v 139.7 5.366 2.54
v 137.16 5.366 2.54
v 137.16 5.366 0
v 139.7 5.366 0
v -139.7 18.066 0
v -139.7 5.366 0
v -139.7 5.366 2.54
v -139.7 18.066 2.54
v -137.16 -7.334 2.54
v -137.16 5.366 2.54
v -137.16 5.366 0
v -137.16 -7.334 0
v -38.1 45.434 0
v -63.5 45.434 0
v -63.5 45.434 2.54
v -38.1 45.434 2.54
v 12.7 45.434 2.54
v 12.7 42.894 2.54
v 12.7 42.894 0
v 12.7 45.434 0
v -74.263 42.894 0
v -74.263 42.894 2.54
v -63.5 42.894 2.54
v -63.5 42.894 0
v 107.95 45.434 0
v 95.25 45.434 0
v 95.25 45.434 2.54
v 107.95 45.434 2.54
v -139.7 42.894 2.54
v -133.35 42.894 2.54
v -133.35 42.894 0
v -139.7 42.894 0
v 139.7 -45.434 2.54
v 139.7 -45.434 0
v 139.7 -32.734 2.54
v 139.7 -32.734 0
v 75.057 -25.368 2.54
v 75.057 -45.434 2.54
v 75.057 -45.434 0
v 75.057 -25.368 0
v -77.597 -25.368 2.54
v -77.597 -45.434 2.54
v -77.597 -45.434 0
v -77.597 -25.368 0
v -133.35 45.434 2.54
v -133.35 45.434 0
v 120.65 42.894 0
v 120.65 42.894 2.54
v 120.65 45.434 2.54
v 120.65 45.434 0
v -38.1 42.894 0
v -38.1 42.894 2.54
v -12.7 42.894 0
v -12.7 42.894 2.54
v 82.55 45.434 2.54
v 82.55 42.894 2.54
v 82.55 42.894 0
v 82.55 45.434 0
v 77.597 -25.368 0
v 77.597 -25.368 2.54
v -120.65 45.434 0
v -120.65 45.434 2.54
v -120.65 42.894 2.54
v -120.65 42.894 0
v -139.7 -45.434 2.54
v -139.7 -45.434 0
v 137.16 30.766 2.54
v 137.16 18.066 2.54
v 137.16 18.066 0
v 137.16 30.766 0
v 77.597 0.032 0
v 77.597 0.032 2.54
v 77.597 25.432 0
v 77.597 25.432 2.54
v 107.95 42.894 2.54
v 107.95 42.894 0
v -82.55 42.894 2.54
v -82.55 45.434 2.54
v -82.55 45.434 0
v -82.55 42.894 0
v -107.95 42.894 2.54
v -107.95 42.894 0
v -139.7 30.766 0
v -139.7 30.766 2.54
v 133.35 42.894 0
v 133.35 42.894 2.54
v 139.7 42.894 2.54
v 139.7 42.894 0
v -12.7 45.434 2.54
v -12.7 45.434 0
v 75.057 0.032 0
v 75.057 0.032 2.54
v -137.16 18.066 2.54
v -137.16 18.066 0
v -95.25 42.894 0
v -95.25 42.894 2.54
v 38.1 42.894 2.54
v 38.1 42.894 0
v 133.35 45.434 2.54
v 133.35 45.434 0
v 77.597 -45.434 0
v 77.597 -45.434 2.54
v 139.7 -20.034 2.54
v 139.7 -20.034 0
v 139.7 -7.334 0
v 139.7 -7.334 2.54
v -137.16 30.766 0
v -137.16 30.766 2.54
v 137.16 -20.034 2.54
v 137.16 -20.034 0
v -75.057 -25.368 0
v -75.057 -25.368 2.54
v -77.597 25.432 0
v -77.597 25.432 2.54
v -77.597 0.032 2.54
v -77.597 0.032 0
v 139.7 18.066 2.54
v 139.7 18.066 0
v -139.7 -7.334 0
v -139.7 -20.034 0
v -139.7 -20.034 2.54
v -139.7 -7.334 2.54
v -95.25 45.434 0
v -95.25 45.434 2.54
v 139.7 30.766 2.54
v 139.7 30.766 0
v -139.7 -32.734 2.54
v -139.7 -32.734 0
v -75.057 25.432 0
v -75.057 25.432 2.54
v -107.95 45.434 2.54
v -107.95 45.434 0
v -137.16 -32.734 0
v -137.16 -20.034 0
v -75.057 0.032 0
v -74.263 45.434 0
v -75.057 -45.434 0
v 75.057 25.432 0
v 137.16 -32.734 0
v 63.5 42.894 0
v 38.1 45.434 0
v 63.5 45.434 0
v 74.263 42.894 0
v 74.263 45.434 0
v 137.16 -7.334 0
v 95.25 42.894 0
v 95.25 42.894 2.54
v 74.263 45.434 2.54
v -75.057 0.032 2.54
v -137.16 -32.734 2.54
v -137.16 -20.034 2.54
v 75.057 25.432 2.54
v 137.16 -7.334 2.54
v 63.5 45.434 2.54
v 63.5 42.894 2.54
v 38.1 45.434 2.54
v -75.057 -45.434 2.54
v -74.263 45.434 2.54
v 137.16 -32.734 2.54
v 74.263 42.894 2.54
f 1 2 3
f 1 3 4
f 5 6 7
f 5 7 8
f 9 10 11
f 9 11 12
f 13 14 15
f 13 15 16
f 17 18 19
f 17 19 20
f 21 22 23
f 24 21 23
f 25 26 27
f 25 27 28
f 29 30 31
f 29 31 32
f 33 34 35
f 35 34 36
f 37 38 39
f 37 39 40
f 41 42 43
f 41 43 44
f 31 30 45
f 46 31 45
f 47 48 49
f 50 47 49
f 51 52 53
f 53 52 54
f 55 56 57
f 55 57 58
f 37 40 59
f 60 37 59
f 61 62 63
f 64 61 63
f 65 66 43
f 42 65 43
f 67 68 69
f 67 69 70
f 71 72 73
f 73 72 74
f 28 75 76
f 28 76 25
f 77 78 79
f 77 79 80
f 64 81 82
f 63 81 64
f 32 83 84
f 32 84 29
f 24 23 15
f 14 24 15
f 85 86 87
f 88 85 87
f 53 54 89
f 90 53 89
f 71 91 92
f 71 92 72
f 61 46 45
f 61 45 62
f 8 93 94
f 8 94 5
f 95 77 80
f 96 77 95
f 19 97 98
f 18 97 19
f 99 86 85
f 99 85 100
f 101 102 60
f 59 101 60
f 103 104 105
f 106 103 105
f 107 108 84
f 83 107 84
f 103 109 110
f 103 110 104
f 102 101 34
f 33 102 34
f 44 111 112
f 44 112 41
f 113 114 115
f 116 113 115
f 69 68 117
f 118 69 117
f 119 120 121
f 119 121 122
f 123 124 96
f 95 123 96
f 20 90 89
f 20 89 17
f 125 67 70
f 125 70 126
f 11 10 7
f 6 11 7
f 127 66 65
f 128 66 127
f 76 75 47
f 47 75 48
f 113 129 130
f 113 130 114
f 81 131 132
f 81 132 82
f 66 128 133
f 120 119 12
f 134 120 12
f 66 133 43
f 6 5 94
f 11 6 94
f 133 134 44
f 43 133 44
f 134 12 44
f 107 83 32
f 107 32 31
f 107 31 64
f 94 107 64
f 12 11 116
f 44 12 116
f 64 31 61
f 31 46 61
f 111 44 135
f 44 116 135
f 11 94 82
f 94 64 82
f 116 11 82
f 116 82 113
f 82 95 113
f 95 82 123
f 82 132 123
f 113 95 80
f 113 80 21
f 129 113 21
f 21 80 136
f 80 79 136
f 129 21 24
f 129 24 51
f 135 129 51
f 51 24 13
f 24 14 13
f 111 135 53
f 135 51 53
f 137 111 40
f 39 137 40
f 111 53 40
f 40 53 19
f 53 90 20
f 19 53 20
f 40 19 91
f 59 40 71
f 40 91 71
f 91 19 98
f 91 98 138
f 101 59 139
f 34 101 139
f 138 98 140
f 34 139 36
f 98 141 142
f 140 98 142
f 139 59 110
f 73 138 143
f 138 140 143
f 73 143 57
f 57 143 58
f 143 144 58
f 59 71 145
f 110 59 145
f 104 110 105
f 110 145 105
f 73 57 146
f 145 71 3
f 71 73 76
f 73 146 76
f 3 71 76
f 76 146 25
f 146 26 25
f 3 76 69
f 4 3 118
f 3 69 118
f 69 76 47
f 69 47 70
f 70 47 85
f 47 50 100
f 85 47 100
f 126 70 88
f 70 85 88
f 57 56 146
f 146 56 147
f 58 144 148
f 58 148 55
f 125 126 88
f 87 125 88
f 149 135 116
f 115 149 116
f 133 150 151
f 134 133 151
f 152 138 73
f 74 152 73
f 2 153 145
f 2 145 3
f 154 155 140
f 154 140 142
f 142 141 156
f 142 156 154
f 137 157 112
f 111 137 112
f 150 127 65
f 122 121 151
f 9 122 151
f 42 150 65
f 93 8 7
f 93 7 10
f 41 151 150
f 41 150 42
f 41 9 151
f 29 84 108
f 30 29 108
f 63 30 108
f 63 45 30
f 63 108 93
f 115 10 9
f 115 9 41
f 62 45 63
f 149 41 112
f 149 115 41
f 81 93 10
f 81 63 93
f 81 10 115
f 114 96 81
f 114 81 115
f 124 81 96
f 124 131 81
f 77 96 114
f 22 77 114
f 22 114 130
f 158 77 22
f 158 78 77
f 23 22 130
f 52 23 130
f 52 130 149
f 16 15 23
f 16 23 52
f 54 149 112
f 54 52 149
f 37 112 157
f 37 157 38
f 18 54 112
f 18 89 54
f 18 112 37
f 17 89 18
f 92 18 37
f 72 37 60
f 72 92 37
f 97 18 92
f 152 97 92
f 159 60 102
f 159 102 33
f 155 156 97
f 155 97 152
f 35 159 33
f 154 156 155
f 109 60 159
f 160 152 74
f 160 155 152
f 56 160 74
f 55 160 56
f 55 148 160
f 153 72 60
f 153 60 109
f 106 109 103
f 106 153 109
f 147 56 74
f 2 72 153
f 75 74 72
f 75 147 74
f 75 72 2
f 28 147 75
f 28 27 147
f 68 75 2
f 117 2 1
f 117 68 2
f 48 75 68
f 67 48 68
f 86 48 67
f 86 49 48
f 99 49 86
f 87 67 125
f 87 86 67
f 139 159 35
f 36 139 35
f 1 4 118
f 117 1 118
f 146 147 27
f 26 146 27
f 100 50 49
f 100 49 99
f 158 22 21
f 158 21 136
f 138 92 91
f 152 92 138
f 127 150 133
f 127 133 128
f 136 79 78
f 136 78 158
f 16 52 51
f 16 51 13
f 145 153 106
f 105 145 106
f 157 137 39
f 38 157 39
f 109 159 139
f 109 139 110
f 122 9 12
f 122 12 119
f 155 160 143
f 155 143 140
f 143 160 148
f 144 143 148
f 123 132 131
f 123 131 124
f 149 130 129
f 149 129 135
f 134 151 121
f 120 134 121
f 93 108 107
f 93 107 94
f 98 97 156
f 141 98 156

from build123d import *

# Parameters (mm, degrees)
SKETCH1_W               = 279.4
SKETCH1_H               = 90.8685
BOSS_EXTRUDE1_DEPTH     = 2.54
SKETCH2_W               = 12.7
SKETCH2_H               = 2.54
CUT_EXTRUDE1_DEPTH      = 147.92451352
LPATTERN1_COUNT         = 3
LPATTERN1_PITCH         = 25.4
MIRROR1_COPY_1_SKETCH_W = 12.7
MIRROR1_COPY_1_SKETCH_H = 2.54
MIRROR1_COPY_1_DEPTH    = 147.92451352
MIRROR1_COPY_2_SKETCH_W = 12.7
MIRROR1_COPY_2_SKETCH_H = 2.54
MIRROR1_COPY_2_DEPTH    = 147.92451352
SKETCH3_W               = 2.54
SKETCH3_H               = 25.4
CUT_EXTRUDE2_DEPTH      = 147.92451352
LPATTERN2_COUNT         = 2
LPATTERN2_PITCH         = 50.8
MIRROR2_COPY_1_SKETCH_W = 2.54
MIRROR2_COPY_1_SKETCH_H = 25.4
MIRROR2_COPY_1_DEPTH    = 147.92451352
SKETCH4_W               = 2.54
SKETCH4_H               = 12.7
CUT_EXTRUDE3_DEPTH      = 147.92451352
LPATTERN3_COUNT         = 3
LPATTERN3_PITCH         = 25.4
MIRROR3_COPY_1_SKETCH_W = 2.54
MIRROR3_COPY_1_SKETCH_H = 12.7
MIRROR3_COPY_1_DEPTH    = 147.92451352
MIRROR3_COPY_2_SKETCH_W = 2.54
MIRROR3_COPY_2_SKETCH_H = 12.7
MIRROR3_COPY_2_DEPTH    = 147.92451352
SKETCH5_W               = 25.4
SKETCH5_H               = 2.54
SKETCH5_W_2             = 10.76325
CUT_EXTRUDE4_DEPTH      = 147.92451352


with BuildPart() as part:
    # Sketch1 → Boss-Extrude1 (new body)
    with BuildSketch(Plane.XY):
        Rectangle(SKETCH1_W, SKETCH1_H)
    extrude(amount=BOSS_EXTRUDE1_DEPTH)

    # Sketch2 → Cut-Extrude1 (cut, through all)
    with BuildSketch(Plane.XY.offset(2.54)):
        with Locations((139.7, 44.16425)):
            Rectangle(SKETCH2_W, SKETCH2_H)
    cut_extrude1 = extrude(amount=-CUT_EXTRUDE1_DEPTH, mode=Mode.SUBTRACT)

    # LPattern1: Cut-Extrude1 ×3
    with Locations(*[(-i * LPATTERN1_PITCH, 0, 0) for i in range(1, LPATTERN1_COUNT)]):
        add(cut_extrude1, mode=Mode.SUBTRACT)

    # Mirror1: Cut-Extrude1 across plane
    add(cut_extrude1.mirror(Plane(origin=(0, 0, 0), x_dir=(0, 0, 1), z_dir=(1, 0, 0))), mode=Mode.SUBTRACT)

    # Mirror1 copy 1 sketch → Mirror1 copy 1 (cut, through all)
    with BuildSketch(Plane(origin=(25.4, 0, 2.54), x_dir=(-1, 0, 0), z_dir=(0, 0, 1))):
        with Locations((139.7, -44.16425)):
            Rectangle(MIRROR1_COPY_1_SKETCH_W, MIRROR1_COPY_1_SKETCH_H)
    extrude(amount=-MIRROR1_COPY_1_DEPTH, mode=Mode.SUBTRACT)

    # Mirror1 copy 2 sketch → Mirror1 copy 2 (cut, through all)
    with BuildSketch(Plane(origin=(50.8, 0, 2.54), x_dir=(-1, 0, 0), z_dir=(0, 0, 1))):
        with Locations((139.7, -44.16425)):
            Rectangle(MIRROR1_COPY_2_SKETCH_W, MIRROR1_COPY_2_SKETCH_H)
    extrude(amount=-MIRROR1_COPY_2_DEPTH, mode=Mode.SUBTRACT)

    # Sketch3 → Cut-Extrude2 (cut, through all)
    with BuildSketch(Plane.XY.offset(2.54)):
        with Locations((76.327, -38.06825)):
            Rectangle(SKETCH3_W, SKETCH3_H)
    cut_extrude2 = extrude(amount=-CUT_EXTRUDE2_DEPTH, mode=Mode.SUBTRACT)

    # LPattern2: Cut-Extrude2 ×2
    with Locations(*[(0, i * LPATTERN2_PITCH, 0) for i in range(1, LPATTERN2_COUNT)]):
        add(cut_extrude2, mode=Mode.SUBTRACT)

    # Mirror2: Cut-Extrude2 across plane
    add(cut_extrude2.mirror(Plane(origin=(0, 0, 0), x_dir=(0, 0, 1), z_dir=(1, 0, 0))), mode=Mode.SUBTRACT)

    # Mirror2 copy 1 sketch → Mirror2 copy 1 (cut, through all)
    with BuildSketch(Plane(origin=(0, 50.8, 2.54), x_dir=(-1, 0, 0), z_dir=(0, 0, 1))):
        with Locations((76.327, 38.06825)):
            Rectangle(MIRROR2_COPY_1_SKETCH_W, MIRROR2_COPY_1_SKETCH_H)
    extrude(amount=-MIRROR2_COPY_1_DEPTH, mode=Mode.SUBTRACT)

    # Sketch4 → Cut-Extrude3 (cut, through all)
    with BuildSketch(Plane.XY.offset(2.54)):
        with Locations((138.43, -26.38425)):
            Rectangle(SKETCH4_W, SKETCH4_H)
    cut_extrude3 = extrude(amount=-CUT_EXTRUDE3_DEPTH, mode=Mode.SUBTRACT)

    # LPattern3: Cut-Extrude3 ×3
    with Locations(*[(0, i * LPATTERN3_PITCH, 0) for i in range(1, LPATTERN3_COUNT)]):
        add(cut_extrude3, mode=Mode.SUBTRACT)

    # Mirror3: Cut-Extrude3 across plane
    add(cut_extrude3.mirror(Plane(origin=(0, 0, 0), x_dir=(0, 0, 1), z_dir=(1, 0, 0))), mode=Mode.SUBTRACT)

    # Mirror3 copy 1 sketch → Mirror3 copy 1 (cut, through all)
    with BuildSketch(Plane(origin=(0, 25.4, 2.54), x_dir=(-1, 0, 0), z_dir=(0, 0, 1))):
        with Locations((138.43, 26.38425)):
            Rectangle(MIRROR3_COPY_1_SKETCH_W, MIRROR3_COPY_1_SKETCH_H)
    extrude(amount=-MIRROR3_COPY_1_DEPTH, mode=Mode.SUBTRACT)

    # Mirror3 copy 2 sketch → Mirror3 copy 2 (cut, through all)
    with BuildSketch(Plane(origin=(0, 50.8, 2.54), x_dir=(-1, 0, 0), z_dir=(0, 0, 1))):
        with Locations((138.43, 26.38425)):
            Rectangle(MIRROR3_COPY_2_SKETCH_W, MIRROR3_COPY_2_SKETCH_H)
    extrude(amount=-MIRROR3_COPY_2_DEPTH, mode=Mode.SUBTRACT)

    # Sketch5 → Cut-Extrude4 (cut, through all)
    with BuildSketch(Plane.XY.offset(2.54)):
        with Locations((-25.4, 44.16425)):
            Rectangle(SKETCH5_W, SKETCH5_H)
        with Locations((-68.881625, 44.16425)):
            Rectangle(SKETCH5_W_2, SKETCH5_H)
    cut_extrude4 = extrude(amount=-CUT_EXTRUDE4_DEPTH, mode=Mode.SUBTRACT)

    # Mirror4: Cut-Extrude4 across plane
    add(cut_extrude4.mirror(Plane(origin=(0, 0, 0), x_dir=(0, 0, 1), z_dir=(1, 0, 0))), mode=Mode.SUBTRACT)


solid = part.part
